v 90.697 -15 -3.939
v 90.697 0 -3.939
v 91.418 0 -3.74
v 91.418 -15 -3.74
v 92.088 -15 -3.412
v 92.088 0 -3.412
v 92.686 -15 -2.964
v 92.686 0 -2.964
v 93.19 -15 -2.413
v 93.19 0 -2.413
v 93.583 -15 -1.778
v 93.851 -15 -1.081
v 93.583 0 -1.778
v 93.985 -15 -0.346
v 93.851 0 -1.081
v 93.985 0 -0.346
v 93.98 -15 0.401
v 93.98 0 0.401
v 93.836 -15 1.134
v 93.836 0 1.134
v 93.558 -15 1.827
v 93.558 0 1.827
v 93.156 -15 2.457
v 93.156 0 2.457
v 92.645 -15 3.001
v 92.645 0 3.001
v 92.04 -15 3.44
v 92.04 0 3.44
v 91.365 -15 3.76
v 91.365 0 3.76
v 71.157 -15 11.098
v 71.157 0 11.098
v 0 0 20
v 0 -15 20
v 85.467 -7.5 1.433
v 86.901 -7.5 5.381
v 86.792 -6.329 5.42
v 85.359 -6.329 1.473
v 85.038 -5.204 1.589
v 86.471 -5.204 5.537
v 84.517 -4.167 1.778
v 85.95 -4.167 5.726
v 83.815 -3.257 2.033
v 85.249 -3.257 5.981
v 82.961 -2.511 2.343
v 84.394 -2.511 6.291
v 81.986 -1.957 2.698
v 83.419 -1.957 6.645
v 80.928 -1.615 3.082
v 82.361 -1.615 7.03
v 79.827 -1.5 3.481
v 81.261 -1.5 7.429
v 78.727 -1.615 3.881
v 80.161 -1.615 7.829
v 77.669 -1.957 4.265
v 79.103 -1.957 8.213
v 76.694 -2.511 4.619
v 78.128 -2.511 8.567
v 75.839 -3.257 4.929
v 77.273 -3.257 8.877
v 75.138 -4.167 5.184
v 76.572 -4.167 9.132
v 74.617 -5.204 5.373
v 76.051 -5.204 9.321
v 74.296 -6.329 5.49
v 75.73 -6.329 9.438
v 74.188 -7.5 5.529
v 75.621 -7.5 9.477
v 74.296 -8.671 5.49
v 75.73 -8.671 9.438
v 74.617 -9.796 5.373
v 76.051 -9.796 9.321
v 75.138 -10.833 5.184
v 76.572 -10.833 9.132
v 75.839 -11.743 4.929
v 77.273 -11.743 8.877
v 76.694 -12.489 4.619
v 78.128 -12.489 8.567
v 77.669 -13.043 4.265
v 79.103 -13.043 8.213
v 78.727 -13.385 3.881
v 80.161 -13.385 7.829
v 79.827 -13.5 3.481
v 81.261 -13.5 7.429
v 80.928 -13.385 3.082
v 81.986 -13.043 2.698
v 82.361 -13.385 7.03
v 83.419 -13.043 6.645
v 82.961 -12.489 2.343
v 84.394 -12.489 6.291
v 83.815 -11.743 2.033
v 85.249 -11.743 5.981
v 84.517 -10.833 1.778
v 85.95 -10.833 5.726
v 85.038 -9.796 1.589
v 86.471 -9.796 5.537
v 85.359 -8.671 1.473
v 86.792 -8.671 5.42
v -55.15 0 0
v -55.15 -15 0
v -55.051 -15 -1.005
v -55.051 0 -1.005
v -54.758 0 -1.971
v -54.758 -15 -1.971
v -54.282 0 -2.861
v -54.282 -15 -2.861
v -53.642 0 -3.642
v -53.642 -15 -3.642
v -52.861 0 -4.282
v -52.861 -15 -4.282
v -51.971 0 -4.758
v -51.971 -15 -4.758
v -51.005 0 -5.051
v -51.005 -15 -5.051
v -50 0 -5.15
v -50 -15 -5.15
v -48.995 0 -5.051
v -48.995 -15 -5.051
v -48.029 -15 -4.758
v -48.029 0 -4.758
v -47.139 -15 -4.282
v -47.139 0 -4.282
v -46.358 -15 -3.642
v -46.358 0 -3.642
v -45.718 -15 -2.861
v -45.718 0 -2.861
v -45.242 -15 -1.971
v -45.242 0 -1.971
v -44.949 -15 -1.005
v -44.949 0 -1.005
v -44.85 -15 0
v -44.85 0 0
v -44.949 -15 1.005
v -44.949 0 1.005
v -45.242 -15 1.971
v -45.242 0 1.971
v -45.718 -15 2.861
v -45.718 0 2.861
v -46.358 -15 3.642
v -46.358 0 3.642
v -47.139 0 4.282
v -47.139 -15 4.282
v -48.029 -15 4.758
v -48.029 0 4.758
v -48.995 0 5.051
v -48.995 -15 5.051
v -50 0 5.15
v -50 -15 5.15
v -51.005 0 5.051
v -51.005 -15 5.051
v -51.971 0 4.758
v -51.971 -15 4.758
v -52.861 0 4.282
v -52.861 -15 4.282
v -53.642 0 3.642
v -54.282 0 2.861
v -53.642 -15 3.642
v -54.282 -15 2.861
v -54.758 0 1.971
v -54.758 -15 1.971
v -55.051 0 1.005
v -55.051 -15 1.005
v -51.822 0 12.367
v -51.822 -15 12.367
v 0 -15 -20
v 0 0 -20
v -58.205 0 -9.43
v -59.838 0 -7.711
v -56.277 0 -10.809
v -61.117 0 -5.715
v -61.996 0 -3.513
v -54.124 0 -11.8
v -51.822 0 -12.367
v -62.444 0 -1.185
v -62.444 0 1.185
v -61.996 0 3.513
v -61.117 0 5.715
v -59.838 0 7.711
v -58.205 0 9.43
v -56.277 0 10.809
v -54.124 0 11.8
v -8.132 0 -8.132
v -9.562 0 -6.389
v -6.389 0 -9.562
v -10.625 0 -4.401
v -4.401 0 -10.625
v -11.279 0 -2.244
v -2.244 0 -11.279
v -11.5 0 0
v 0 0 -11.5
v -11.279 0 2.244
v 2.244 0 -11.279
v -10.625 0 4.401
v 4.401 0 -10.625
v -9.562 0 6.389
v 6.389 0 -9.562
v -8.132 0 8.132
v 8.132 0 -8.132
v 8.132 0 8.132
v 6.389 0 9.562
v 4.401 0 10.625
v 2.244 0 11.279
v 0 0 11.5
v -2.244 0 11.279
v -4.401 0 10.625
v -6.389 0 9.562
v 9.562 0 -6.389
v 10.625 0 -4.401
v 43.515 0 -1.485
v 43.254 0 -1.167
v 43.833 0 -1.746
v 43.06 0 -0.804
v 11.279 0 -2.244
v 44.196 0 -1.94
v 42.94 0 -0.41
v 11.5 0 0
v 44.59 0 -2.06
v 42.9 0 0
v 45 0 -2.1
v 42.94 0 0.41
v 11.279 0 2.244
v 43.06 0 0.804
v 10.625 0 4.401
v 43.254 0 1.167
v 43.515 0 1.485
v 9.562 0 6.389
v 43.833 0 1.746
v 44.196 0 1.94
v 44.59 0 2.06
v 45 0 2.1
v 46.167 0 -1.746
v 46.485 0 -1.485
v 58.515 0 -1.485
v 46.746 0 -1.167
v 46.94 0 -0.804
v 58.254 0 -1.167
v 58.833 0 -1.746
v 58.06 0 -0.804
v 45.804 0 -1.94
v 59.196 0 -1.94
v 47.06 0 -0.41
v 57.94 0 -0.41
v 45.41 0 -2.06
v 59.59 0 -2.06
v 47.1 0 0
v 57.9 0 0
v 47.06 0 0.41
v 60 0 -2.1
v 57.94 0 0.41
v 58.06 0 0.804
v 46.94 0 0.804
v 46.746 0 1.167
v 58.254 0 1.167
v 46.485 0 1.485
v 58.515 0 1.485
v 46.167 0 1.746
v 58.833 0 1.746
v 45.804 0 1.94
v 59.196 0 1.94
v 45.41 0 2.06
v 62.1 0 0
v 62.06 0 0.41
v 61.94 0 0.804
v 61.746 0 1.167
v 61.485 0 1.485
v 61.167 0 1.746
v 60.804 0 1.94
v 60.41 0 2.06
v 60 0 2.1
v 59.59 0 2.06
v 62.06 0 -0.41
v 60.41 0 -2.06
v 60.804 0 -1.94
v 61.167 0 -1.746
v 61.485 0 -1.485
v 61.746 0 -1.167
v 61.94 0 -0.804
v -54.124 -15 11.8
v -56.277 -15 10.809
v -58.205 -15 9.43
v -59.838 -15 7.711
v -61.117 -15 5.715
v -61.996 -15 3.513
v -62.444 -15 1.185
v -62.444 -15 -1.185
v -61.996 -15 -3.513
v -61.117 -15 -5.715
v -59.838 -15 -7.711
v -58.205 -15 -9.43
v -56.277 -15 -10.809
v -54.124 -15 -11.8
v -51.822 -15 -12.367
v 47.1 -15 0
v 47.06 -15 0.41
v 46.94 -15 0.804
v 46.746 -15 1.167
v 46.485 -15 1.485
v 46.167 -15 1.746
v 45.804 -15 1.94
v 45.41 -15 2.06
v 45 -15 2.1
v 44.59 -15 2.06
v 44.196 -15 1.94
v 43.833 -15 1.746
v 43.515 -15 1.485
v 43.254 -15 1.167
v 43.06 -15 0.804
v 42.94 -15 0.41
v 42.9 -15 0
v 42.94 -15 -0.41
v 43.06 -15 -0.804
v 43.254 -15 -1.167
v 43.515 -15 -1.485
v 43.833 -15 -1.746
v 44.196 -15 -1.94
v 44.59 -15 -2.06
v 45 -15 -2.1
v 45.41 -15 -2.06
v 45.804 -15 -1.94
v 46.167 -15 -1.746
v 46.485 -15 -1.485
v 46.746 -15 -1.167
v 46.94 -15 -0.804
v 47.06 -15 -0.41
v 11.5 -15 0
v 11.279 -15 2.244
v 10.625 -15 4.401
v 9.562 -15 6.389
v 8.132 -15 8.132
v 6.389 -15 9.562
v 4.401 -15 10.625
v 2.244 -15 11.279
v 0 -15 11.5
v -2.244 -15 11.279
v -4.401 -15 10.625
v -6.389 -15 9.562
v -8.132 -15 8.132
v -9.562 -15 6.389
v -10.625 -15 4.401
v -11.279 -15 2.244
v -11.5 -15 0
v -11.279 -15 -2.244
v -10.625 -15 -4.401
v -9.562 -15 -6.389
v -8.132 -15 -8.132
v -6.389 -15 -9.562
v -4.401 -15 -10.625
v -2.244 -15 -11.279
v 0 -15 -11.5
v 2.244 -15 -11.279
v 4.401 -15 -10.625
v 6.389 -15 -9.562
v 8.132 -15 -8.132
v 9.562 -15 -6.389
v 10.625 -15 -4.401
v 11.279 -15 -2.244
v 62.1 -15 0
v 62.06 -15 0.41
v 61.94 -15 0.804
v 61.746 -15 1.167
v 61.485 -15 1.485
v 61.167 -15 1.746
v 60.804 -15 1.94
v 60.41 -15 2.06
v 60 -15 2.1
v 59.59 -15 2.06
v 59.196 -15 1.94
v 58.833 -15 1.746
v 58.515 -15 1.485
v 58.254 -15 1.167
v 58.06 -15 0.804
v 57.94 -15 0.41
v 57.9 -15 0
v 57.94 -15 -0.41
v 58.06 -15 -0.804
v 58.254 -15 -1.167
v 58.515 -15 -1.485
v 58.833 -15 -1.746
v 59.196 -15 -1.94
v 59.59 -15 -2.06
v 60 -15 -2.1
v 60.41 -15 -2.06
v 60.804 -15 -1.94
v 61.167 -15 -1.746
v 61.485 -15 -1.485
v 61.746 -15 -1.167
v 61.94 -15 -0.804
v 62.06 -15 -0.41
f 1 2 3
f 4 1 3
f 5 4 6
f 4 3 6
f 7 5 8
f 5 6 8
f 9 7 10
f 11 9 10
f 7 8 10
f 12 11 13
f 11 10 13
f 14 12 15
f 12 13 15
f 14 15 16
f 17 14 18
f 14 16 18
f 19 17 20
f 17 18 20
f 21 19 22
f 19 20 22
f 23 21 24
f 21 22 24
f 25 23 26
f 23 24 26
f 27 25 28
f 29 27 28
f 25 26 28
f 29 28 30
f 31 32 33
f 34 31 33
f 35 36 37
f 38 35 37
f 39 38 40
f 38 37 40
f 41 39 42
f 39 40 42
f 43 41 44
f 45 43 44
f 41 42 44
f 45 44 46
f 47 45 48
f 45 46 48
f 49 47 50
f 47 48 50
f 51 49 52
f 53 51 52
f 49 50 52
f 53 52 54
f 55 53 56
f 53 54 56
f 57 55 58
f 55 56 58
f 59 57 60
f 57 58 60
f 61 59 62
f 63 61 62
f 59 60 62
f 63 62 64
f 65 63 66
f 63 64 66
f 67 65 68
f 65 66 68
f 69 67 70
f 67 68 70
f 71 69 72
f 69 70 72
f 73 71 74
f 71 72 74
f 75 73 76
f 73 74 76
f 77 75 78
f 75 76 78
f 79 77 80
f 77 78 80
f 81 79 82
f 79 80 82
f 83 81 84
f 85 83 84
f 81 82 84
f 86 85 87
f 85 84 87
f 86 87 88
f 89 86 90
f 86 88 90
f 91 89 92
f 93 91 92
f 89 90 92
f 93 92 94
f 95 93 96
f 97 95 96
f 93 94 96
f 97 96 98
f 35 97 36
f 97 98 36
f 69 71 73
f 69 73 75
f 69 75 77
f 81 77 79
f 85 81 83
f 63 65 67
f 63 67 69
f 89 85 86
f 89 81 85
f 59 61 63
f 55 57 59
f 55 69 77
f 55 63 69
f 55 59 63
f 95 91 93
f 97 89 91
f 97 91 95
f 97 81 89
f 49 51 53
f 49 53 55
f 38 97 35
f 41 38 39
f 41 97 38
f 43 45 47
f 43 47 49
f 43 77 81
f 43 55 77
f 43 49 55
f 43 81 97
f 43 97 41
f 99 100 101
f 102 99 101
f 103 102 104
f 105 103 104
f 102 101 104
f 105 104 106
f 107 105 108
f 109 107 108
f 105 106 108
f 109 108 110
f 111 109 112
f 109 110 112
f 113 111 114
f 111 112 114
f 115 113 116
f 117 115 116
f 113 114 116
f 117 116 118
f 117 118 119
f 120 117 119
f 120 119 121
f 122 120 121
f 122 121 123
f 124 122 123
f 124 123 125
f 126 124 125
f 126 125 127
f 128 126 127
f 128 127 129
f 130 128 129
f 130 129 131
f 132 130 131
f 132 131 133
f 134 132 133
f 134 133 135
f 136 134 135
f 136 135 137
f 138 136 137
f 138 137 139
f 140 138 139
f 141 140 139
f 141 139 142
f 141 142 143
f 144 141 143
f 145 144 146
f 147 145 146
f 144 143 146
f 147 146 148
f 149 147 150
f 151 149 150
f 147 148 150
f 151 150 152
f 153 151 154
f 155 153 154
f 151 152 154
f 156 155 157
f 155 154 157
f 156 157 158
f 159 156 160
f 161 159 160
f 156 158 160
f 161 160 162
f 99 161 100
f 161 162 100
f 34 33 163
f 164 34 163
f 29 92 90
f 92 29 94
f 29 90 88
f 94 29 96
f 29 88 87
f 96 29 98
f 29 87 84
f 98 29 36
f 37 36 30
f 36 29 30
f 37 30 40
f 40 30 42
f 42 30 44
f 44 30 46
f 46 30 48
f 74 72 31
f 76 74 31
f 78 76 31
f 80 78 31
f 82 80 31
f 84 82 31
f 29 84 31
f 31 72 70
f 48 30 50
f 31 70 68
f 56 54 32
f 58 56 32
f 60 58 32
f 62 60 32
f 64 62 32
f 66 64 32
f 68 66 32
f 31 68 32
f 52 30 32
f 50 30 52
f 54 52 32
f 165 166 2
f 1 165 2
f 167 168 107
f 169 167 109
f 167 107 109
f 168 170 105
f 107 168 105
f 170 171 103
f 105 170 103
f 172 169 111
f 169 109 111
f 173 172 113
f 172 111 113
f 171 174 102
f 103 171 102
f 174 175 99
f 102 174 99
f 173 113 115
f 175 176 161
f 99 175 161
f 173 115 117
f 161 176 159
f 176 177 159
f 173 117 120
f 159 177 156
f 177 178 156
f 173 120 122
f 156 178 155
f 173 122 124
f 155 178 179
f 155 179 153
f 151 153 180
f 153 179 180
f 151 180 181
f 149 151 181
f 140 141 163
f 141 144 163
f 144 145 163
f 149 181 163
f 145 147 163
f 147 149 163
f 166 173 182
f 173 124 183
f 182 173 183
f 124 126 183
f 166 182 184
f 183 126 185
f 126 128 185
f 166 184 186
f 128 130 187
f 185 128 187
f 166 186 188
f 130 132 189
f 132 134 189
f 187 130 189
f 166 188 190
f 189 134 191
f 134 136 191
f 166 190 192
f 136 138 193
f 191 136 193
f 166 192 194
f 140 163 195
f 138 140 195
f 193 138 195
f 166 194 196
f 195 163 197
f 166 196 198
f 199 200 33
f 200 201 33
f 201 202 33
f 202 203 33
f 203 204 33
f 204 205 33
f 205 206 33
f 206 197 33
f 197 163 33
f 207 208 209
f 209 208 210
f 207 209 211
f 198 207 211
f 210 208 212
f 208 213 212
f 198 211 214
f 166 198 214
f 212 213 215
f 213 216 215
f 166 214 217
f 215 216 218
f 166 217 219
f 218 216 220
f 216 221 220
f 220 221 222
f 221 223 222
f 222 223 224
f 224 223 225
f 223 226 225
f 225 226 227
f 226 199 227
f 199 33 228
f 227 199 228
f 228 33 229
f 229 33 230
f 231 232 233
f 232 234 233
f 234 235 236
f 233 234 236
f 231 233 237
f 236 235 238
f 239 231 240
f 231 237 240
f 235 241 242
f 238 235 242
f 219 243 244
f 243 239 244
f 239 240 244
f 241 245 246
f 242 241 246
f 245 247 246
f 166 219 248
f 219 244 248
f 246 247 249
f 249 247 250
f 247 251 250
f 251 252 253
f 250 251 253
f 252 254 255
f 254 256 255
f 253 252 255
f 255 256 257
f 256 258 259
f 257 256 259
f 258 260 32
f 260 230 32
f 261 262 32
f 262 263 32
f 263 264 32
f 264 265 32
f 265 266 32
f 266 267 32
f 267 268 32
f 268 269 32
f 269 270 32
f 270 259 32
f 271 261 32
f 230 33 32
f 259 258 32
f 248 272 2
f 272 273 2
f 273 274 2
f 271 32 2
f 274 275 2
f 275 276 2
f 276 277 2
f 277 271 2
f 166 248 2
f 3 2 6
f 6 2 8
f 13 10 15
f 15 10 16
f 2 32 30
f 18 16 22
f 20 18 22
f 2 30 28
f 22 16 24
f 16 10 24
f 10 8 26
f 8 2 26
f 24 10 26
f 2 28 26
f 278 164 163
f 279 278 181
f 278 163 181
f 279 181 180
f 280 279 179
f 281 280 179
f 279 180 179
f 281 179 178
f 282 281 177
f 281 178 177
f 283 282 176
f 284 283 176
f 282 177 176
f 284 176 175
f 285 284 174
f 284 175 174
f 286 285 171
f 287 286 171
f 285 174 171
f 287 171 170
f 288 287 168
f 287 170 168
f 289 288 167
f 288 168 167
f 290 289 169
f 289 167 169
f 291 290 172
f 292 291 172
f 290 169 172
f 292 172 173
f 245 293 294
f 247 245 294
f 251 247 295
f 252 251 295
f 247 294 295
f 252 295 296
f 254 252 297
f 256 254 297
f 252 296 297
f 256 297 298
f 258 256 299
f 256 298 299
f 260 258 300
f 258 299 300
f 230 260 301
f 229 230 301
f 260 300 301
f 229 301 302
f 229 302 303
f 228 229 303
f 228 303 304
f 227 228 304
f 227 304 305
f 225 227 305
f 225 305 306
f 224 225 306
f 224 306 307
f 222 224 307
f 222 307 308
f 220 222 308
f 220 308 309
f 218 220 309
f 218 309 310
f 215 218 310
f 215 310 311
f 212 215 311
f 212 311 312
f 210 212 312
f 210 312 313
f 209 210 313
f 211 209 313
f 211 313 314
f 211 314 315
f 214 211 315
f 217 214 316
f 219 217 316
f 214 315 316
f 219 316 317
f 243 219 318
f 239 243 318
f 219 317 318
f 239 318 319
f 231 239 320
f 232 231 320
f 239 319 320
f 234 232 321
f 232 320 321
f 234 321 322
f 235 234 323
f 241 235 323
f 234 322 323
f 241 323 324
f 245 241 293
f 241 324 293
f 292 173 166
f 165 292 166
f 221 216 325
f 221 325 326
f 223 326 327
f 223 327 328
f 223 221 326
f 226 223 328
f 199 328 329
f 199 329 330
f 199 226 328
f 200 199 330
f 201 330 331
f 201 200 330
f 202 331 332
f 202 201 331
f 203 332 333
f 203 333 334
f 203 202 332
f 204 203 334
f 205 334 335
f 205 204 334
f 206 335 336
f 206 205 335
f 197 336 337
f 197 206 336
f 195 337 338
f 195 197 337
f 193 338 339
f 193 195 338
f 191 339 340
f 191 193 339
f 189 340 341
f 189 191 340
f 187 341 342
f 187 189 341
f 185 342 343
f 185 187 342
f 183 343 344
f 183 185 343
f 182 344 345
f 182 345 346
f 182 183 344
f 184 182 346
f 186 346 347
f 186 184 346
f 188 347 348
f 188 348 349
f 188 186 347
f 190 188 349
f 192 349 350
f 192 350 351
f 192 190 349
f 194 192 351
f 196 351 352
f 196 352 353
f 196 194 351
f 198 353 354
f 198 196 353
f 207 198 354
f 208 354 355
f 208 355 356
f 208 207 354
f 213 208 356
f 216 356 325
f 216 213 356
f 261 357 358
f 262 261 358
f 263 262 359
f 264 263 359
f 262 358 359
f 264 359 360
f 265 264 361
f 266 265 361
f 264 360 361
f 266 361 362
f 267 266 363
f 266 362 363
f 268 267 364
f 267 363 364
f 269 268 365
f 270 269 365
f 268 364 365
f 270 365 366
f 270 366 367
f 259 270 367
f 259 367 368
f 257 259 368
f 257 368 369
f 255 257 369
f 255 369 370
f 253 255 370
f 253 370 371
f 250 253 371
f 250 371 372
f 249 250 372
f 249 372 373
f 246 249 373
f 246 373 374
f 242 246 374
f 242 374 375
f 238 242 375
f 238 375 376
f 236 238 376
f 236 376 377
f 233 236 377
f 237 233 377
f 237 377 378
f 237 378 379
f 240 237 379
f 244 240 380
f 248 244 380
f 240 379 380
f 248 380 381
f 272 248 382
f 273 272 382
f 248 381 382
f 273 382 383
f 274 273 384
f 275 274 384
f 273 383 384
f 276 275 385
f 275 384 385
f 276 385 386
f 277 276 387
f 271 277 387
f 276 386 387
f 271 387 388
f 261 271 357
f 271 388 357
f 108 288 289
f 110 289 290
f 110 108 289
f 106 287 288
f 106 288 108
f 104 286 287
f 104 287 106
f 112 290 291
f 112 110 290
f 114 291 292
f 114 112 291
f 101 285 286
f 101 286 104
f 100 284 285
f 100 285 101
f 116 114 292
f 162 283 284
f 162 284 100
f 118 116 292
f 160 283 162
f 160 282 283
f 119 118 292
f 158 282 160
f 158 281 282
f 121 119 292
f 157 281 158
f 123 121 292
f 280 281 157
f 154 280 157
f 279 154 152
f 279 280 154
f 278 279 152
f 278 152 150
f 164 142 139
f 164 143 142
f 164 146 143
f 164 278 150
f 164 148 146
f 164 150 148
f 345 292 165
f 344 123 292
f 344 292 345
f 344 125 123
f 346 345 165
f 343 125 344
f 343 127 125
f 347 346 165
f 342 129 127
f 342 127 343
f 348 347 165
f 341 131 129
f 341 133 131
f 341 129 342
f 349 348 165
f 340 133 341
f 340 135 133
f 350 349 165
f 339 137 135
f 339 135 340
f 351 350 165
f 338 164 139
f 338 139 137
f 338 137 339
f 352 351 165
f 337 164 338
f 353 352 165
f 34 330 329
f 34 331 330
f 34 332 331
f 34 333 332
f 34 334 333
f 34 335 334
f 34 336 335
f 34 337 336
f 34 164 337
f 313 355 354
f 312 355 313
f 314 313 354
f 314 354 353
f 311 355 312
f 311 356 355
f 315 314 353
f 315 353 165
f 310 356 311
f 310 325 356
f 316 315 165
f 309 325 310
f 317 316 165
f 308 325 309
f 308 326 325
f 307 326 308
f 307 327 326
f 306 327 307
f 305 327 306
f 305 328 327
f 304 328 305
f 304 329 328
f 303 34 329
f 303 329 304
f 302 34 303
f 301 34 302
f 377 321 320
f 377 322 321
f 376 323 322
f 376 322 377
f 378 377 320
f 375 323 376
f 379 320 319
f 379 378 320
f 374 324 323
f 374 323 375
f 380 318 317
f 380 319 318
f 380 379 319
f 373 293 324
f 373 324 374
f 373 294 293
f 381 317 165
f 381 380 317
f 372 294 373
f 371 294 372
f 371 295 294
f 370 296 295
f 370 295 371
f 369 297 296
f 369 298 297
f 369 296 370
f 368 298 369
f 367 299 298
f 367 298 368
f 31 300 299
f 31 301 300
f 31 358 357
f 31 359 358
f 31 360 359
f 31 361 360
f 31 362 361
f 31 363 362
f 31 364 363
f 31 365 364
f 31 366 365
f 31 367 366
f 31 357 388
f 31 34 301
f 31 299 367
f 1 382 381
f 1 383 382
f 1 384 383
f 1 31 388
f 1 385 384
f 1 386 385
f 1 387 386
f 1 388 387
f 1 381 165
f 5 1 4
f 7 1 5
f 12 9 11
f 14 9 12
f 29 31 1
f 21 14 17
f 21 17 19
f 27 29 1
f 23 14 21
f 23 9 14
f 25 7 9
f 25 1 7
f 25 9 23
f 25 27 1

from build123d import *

# Parameters (mm, degrees)
F0_R     = 11.5
F1_DEPTH = 15
F3_D     = 4.2
F4_D     = 10.3
F5_R     = 6
F6_DEPTH = 4.2


with BuildPart() as f1:
    # F0 (on Front) → F1 (new body)
    with BuildSketch(Plane.XZ):
        with BuildLine():
            Line((71.156512348, 11.0983319967), (0, 20))
            Line((0, 20), (-51.8216221637, 12.3665554094))
            ThreePointArc((-51.8216221637, 12.3665554094), (-62.5, 0), (-51.8216221637, -12.3665554094))
            Line((-51.8216221637, -12.3665554094), (0, -20))
            Line((0, -20), (90.6974930025, -3.9387185113))
            ThreePointArc((90.6974930025, -3.9387185113), (93.9850344054, -0.3456888592), (91.3653125965, 3.7597767904))
            Line((91.3653125965, 3.7597767904), (71.156512348, 11.0983319967))
        make_face()
        Circle(F0_R, mode=Mode.SUBTRACT)
    extrude(amount=F1_DEPTH)

    # F3 (through all)
    with Locations(Plane(origin=(0, 0, 0), x_dir=(-1, 0, 0), z_dir=(0, 1, 0))):
        with Locations((-60, 0), (-45, 0)):
            Hole(F3_D / 2)

    # F4 (through all)
    with Locations(Plane(origin=(0, 0, 0), x_dir=(1, 0, 0), z_dir=(0, 1, 0))):
        with Locations((-50, 0)):
            Hole(F4_D / 2)

    # F5 (on face) → F6 (cut)
    with BuildSketch(Plane(origin=(11.8507540815, 0, 32.6344239833), x_dir=(0.9399441976, 0, -0.3413281491), z_dir=(0.3413281491, 0, 0.9399441976))):
        with Locations((73.8449777845, -7.5)):
            Circle(F5_R)
    extrude(amount=-F6_DEPTH, mode=Mode.SUBTRACT)


solid = f1.part
